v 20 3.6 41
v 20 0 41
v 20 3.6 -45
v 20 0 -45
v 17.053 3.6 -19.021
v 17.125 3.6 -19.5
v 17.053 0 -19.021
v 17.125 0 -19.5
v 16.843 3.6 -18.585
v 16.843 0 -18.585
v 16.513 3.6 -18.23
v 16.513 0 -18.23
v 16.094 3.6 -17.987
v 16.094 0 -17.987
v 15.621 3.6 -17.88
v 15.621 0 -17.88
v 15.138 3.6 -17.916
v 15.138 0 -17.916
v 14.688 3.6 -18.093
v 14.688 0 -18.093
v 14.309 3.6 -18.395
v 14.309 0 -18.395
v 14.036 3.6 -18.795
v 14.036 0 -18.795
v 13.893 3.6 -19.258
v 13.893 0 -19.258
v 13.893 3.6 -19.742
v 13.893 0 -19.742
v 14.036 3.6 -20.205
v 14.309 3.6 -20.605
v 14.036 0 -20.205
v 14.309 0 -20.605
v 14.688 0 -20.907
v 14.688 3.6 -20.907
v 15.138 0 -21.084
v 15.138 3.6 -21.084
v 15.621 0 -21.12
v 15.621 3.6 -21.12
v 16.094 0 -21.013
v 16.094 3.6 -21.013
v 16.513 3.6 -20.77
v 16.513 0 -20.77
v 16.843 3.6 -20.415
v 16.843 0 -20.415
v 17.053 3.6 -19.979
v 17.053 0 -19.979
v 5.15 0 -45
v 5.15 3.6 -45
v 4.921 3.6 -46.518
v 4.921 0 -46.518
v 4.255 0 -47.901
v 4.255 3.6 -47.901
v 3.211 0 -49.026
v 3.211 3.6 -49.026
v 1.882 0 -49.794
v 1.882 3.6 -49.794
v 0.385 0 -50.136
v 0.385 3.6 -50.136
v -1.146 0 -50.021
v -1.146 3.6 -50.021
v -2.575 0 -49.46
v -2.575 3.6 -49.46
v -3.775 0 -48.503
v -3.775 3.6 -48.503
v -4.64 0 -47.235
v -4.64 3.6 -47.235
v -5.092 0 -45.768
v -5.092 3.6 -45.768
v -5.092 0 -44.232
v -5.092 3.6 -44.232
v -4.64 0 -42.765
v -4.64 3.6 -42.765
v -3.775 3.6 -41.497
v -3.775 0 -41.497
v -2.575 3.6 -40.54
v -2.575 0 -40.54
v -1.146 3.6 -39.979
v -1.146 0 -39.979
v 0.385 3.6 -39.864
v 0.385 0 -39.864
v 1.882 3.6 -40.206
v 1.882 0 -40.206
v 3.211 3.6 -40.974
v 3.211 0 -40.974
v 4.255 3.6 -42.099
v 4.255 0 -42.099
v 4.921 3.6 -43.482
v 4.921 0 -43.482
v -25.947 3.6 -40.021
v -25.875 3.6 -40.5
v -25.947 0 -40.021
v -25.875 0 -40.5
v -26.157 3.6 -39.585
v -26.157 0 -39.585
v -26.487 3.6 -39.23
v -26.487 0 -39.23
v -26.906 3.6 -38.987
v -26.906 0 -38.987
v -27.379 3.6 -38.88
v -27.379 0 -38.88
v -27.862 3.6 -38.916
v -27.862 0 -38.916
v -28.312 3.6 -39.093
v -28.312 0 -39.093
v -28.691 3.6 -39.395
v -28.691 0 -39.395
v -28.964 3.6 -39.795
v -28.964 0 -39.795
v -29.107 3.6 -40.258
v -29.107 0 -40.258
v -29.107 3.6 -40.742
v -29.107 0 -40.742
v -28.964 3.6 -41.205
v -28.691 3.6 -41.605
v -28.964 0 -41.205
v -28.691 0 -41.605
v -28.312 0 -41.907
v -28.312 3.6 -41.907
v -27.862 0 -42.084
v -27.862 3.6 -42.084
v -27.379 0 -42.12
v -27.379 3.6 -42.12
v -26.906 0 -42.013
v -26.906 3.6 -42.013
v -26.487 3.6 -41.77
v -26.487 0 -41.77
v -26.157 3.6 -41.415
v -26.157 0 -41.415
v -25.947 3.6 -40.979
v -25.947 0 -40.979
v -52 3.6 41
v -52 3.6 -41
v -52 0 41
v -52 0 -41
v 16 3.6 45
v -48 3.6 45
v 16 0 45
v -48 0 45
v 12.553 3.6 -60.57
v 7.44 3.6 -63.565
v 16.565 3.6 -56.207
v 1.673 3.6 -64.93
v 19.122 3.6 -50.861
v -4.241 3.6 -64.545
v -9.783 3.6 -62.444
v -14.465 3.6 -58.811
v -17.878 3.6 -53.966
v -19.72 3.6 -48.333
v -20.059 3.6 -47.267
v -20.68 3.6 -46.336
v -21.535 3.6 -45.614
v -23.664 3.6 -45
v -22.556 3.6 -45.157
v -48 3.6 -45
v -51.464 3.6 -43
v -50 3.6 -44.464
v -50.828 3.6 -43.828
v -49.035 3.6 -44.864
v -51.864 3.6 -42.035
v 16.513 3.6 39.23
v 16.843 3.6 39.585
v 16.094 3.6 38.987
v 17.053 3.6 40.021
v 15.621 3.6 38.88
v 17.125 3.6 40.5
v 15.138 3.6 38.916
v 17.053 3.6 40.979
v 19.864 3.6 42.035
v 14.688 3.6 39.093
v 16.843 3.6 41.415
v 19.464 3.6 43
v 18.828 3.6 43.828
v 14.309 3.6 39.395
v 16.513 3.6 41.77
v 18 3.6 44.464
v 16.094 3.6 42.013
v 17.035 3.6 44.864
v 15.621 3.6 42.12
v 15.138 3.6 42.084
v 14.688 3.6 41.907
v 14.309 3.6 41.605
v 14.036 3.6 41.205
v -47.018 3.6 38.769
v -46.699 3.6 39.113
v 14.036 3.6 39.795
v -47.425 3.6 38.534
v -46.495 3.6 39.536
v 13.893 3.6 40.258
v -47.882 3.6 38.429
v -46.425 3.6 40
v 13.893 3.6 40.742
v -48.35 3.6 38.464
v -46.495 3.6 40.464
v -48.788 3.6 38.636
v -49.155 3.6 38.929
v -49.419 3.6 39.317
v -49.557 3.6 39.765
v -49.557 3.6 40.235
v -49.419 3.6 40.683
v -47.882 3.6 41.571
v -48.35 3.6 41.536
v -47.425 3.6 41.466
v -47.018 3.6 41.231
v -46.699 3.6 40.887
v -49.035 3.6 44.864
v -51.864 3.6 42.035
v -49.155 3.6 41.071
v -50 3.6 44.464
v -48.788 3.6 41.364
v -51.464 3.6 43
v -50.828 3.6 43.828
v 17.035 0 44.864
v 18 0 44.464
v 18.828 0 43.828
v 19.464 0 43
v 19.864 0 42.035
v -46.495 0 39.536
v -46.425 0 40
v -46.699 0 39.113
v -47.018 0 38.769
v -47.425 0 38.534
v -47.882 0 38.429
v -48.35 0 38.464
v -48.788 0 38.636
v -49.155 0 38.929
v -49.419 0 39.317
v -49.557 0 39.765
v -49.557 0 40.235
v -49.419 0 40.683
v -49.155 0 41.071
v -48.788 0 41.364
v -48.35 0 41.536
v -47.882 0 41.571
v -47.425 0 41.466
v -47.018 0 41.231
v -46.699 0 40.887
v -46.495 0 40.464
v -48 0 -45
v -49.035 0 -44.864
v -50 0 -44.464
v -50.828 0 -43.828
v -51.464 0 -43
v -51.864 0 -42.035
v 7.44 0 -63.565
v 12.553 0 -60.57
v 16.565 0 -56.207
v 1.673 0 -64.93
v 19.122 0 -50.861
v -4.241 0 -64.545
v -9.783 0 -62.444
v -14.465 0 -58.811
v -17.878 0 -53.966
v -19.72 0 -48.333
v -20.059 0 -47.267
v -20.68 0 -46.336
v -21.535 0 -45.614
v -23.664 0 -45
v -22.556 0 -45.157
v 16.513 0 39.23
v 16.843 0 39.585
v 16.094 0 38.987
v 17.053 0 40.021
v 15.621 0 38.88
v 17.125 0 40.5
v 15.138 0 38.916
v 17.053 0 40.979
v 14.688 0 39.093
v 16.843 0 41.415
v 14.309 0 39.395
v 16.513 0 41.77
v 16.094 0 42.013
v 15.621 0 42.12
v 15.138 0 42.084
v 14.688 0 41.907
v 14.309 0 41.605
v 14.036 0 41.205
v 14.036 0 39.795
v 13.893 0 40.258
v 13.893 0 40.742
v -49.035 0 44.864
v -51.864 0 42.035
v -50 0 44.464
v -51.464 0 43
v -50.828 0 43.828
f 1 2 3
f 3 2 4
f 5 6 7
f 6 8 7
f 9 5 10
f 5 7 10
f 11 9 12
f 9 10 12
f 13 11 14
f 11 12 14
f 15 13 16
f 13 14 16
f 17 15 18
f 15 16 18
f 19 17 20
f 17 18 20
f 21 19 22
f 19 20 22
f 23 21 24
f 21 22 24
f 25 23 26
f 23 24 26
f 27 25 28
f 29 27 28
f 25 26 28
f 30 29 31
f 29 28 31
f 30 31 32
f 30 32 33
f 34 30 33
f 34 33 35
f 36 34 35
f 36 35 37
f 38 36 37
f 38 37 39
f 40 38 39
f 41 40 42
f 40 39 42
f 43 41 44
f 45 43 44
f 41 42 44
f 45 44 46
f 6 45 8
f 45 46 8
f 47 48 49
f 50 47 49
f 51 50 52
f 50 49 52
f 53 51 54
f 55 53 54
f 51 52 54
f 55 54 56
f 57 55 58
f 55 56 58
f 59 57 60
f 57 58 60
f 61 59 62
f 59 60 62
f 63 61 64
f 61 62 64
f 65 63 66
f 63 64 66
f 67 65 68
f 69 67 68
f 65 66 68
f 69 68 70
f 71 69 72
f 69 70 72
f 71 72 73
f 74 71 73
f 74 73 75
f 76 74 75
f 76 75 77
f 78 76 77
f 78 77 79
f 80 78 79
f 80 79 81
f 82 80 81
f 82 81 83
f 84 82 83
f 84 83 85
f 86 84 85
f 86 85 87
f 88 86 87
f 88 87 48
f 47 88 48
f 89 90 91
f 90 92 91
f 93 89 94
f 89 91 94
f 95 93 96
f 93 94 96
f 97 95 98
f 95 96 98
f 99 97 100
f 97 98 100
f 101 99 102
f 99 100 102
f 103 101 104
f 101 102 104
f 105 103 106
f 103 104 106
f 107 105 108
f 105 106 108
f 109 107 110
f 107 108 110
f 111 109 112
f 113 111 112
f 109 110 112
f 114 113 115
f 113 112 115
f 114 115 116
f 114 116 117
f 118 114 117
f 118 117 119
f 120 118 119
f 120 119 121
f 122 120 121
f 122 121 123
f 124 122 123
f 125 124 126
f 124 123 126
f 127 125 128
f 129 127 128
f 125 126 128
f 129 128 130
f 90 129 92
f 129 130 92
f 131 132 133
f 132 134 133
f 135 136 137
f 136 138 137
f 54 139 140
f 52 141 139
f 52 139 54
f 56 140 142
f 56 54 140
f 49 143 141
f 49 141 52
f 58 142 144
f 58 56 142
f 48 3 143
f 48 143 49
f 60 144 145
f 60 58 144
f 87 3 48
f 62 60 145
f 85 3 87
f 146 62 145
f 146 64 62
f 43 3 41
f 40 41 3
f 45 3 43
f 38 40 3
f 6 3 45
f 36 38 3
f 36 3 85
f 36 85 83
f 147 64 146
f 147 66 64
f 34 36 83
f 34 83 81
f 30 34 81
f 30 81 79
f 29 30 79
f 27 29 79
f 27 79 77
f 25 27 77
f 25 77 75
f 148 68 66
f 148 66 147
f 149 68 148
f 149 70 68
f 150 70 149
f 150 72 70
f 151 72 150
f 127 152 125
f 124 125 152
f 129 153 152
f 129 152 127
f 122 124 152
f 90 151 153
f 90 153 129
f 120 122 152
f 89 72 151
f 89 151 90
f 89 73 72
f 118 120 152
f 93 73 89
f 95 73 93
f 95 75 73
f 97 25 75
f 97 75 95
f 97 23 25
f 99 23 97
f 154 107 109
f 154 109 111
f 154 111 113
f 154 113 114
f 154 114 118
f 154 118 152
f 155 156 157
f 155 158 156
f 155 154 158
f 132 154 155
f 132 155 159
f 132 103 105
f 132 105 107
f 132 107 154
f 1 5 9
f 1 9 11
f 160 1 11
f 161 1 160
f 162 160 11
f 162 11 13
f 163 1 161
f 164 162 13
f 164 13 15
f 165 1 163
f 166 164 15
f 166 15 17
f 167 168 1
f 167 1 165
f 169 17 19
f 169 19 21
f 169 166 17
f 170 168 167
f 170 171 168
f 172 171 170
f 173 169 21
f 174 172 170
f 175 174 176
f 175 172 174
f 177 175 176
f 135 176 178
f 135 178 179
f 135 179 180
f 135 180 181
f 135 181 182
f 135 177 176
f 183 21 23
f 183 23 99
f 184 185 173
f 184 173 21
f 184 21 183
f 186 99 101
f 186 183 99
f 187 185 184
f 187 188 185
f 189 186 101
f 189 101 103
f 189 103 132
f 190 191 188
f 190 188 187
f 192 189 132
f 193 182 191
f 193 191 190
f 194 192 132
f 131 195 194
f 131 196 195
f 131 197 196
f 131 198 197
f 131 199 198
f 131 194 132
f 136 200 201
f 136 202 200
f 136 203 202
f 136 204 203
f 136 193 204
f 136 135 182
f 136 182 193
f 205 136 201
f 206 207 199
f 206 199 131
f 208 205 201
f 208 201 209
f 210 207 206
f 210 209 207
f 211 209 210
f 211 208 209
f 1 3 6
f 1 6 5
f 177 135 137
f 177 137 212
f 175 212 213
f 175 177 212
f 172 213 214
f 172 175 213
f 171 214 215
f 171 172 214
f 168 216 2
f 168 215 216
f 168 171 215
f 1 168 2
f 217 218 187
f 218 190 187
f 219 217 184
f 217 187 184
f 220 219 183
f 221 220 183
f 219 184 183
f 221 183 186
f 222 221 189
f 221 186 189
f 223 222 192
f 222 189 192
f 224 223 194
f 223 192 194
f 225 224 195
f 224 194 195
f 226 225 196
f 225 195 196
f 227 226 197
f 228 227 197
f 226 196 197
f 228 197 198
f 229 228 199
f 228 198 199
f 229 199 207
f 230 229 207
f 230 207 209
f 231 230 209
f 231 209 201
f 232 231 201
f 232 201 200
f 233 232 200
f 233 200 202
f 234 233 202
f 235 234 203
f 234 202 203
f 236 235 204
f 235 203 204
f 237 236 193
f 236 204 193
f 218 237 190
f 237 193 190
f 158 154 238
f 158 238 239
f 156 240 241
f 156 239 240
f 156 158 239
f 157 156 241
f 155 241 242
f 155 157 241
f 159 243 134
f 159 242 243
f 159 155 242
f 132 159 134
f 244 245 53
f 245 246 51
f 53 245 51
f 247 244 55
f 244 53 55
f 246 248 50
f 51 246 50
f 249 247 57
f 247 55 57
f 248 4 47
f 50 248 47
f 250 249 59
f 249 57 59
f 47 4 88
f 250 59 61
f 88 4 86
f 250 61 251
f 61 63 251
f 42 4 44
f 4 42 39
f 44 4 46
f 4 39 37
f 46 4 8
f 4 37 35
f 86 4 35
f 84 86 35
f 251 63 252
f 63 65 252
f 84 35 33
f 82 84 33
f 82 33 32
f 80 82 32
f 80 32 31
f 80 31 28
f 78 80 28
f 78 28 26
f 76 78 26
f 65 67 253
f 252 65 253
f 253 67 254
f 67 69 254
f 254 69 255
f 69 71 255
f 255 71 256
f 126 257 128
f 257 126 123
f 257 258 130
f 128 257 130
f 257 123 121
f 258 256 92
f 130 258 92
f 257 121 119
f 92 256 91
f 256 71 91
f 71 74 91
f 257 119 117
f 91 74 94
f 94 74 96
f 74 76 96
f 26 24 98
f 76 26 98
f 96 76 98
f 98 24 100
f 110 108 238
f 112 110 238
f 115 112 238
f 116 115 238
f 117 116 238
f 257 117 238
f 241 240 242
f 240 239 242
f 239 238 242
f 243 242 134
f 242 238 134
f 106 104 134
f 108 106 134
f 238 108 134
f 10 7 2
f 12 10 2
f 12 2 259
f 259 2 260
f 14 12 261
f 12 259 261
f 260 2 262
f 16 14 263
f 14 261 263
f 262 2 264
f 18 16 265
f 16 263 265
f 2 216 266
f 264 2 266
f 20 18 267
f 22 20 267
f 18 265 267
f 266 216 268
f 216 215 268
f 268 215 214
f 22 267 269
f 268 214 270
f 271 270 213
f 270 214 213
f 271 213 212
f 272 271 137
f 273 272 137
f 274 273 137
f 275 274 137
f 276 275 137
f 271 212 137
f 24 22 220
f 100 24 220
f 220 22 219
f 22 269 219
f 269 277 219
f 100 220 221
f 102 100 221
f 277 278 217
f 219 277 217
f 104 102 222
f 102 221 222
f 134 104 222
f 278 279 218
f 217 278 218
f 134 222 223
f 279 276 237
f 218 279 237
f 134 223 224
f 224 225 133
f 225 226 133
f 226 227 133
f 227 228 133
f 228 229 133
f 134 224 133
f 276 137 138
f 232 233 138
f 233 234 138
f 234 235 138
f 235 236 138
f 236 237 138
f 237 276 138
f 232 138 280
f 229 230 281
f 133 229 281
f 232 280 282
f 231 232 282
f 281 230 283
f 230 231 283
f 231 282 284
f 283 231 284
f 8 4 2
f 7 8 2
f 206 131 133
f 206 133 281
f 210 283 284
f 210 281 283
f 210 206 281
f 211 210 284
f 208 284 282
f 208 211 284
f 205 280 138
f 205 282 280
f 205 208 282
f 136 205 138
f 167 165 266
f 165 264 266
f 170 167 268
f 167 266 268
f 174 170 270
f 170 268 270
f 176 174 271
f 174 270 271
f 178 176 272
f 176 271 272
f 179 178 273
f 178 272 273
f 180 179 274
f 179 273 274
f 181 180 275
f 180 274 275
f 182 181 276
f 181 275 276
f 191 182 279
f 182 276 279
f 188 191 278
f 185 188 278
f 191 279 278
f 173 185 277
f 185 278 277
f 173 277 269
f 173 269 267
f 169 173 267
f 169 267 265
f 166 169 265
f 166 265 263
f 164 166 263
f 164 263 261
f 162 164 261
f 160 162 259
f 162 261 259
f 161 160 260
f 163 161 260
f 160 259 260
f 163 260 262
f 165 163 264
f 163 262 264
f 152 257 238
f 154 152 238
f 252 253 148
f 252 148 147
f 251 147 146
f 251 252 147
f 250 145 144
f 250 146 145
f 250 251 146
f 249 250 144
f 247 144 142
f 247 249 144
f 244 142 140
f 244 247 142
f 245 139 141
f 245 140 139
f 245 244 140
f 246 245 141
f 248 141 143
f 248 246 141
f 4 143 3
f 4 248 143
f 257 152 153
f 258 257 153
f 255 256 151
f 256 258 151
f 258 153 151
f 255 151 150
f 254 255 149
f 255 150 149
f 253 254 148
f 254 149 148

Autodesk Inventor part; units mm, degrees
ref_plane "YZ Plane" through (0, 0, 0) normal (1, 0, 0) x (0, 1, 0)
ref_plane "XZ Plane" through (0, 0, 0) normal (0, 1, 0) x (-1, 0, 0)
ref_plane "XY Plane" through (0, 0, 0) normal (0, 0, 1) x (1, 0, 0)
sketch "Sketch1" plane through (0, 0, 0) normal (0, 1, 0) x (-1, 0, 0)
  line L0 (20, 45) -> (-20, 45)
  line L1 (-20, 45) -> (-20, -45)
  line L2 (-20, -45) -> (20, -45)
  line L3 (20, -45) -> (20, 45)
  line L4 (20, 45) -> (-20, -45) construction
  line L5 (-20, 45) -> (20, -45) construction
  arc A0 (-20, -45) -> (20, -45) centre (0, -45) ccw
  line L6 (20, -45) -> (52, -45)
  line L7 (52, -45) -> (52, 45)
  line L8 (52, 45) -> (20, 45)
  line L9 (20, 45) -> (20, -45)
  point P0 (0, 0)
  dimension "d0" = 40
  dimension "d1" = 90
  dimension "d7" = 32
  dimension "d8" = 90
extrude "Extrusion1" add sketch "Sketch1" along normal blind 3.6
sketch "Sketch2" plane through (0, 3.6, 0) normal (0, 1, 0) x (1, 0, 0)
  arc A0 (20, 45) -> (-20, 45) centre (0, 45) ccw projected
  circle A1 centre (0, 45) radius 5.15
  point P0 (0, 0)
  dimension "d4" = 10.3
extrude "Extrusion2" cut sketch "Sketch2" against normal blind 3.6
fillet "Fillet1" radius 4 4 edges at (-20, 1.8, -45) (-52, 1.8, -45) (-52, 1.8, 45) (20, 1.8, 45)
sketch "Sketch3" plane through (0, 0, 0) normal (0, -1, 0) x (1, 0, 0)
  circle A0 centre (15.5, 40.5) radius 1.625
  circle A1 centre (15.5, -19.5) radius 1.625
  circle A2 centre (-27.5, -40.5) radius 1.625
  line L0 (-52, -41) -> (-52, 41) projected
  line L1 (-23.6643, -45) -> (-48, -45) projected
  line L2 (20, 41) -> (20, -45) projected
  line L3 (-48, 45) -> (16, 45) projected
  point P0 (0, 0)
  dimension "d10" = 3.25
  dimension "d11" = 3.25
  dimension "d12" = 3.25
  dimension "d13" = 24.5
  dimension "d14" = 4.5
  dimension "d15" = 4.5
  dimension "d16" = 4.5
  dimension "d17" = 4.5
  dimension "d18" = 60
extrude "Extrusion3" cut sketch "Sketch3" against normal blind 3.8
sketch "Sketch4" plane through (0, 3.6, 0) normal (0, 1, 0) x (1, 0, 0)
  circle A0 centre (-48, -40) radius 1.575
  line L0 (-48, -45) -> (16, -45) projected
  line L1 (-52, 41) -> (-52, -41) projected
  point P0 (0, 0)
  dimension "d21" = 3.15
  dimension "d22" = 5
  dimension "d23" = 4
extrude "Extrusion4" cut sketch "Sketch4" against normal blind 3.8
properties part number "p1"
